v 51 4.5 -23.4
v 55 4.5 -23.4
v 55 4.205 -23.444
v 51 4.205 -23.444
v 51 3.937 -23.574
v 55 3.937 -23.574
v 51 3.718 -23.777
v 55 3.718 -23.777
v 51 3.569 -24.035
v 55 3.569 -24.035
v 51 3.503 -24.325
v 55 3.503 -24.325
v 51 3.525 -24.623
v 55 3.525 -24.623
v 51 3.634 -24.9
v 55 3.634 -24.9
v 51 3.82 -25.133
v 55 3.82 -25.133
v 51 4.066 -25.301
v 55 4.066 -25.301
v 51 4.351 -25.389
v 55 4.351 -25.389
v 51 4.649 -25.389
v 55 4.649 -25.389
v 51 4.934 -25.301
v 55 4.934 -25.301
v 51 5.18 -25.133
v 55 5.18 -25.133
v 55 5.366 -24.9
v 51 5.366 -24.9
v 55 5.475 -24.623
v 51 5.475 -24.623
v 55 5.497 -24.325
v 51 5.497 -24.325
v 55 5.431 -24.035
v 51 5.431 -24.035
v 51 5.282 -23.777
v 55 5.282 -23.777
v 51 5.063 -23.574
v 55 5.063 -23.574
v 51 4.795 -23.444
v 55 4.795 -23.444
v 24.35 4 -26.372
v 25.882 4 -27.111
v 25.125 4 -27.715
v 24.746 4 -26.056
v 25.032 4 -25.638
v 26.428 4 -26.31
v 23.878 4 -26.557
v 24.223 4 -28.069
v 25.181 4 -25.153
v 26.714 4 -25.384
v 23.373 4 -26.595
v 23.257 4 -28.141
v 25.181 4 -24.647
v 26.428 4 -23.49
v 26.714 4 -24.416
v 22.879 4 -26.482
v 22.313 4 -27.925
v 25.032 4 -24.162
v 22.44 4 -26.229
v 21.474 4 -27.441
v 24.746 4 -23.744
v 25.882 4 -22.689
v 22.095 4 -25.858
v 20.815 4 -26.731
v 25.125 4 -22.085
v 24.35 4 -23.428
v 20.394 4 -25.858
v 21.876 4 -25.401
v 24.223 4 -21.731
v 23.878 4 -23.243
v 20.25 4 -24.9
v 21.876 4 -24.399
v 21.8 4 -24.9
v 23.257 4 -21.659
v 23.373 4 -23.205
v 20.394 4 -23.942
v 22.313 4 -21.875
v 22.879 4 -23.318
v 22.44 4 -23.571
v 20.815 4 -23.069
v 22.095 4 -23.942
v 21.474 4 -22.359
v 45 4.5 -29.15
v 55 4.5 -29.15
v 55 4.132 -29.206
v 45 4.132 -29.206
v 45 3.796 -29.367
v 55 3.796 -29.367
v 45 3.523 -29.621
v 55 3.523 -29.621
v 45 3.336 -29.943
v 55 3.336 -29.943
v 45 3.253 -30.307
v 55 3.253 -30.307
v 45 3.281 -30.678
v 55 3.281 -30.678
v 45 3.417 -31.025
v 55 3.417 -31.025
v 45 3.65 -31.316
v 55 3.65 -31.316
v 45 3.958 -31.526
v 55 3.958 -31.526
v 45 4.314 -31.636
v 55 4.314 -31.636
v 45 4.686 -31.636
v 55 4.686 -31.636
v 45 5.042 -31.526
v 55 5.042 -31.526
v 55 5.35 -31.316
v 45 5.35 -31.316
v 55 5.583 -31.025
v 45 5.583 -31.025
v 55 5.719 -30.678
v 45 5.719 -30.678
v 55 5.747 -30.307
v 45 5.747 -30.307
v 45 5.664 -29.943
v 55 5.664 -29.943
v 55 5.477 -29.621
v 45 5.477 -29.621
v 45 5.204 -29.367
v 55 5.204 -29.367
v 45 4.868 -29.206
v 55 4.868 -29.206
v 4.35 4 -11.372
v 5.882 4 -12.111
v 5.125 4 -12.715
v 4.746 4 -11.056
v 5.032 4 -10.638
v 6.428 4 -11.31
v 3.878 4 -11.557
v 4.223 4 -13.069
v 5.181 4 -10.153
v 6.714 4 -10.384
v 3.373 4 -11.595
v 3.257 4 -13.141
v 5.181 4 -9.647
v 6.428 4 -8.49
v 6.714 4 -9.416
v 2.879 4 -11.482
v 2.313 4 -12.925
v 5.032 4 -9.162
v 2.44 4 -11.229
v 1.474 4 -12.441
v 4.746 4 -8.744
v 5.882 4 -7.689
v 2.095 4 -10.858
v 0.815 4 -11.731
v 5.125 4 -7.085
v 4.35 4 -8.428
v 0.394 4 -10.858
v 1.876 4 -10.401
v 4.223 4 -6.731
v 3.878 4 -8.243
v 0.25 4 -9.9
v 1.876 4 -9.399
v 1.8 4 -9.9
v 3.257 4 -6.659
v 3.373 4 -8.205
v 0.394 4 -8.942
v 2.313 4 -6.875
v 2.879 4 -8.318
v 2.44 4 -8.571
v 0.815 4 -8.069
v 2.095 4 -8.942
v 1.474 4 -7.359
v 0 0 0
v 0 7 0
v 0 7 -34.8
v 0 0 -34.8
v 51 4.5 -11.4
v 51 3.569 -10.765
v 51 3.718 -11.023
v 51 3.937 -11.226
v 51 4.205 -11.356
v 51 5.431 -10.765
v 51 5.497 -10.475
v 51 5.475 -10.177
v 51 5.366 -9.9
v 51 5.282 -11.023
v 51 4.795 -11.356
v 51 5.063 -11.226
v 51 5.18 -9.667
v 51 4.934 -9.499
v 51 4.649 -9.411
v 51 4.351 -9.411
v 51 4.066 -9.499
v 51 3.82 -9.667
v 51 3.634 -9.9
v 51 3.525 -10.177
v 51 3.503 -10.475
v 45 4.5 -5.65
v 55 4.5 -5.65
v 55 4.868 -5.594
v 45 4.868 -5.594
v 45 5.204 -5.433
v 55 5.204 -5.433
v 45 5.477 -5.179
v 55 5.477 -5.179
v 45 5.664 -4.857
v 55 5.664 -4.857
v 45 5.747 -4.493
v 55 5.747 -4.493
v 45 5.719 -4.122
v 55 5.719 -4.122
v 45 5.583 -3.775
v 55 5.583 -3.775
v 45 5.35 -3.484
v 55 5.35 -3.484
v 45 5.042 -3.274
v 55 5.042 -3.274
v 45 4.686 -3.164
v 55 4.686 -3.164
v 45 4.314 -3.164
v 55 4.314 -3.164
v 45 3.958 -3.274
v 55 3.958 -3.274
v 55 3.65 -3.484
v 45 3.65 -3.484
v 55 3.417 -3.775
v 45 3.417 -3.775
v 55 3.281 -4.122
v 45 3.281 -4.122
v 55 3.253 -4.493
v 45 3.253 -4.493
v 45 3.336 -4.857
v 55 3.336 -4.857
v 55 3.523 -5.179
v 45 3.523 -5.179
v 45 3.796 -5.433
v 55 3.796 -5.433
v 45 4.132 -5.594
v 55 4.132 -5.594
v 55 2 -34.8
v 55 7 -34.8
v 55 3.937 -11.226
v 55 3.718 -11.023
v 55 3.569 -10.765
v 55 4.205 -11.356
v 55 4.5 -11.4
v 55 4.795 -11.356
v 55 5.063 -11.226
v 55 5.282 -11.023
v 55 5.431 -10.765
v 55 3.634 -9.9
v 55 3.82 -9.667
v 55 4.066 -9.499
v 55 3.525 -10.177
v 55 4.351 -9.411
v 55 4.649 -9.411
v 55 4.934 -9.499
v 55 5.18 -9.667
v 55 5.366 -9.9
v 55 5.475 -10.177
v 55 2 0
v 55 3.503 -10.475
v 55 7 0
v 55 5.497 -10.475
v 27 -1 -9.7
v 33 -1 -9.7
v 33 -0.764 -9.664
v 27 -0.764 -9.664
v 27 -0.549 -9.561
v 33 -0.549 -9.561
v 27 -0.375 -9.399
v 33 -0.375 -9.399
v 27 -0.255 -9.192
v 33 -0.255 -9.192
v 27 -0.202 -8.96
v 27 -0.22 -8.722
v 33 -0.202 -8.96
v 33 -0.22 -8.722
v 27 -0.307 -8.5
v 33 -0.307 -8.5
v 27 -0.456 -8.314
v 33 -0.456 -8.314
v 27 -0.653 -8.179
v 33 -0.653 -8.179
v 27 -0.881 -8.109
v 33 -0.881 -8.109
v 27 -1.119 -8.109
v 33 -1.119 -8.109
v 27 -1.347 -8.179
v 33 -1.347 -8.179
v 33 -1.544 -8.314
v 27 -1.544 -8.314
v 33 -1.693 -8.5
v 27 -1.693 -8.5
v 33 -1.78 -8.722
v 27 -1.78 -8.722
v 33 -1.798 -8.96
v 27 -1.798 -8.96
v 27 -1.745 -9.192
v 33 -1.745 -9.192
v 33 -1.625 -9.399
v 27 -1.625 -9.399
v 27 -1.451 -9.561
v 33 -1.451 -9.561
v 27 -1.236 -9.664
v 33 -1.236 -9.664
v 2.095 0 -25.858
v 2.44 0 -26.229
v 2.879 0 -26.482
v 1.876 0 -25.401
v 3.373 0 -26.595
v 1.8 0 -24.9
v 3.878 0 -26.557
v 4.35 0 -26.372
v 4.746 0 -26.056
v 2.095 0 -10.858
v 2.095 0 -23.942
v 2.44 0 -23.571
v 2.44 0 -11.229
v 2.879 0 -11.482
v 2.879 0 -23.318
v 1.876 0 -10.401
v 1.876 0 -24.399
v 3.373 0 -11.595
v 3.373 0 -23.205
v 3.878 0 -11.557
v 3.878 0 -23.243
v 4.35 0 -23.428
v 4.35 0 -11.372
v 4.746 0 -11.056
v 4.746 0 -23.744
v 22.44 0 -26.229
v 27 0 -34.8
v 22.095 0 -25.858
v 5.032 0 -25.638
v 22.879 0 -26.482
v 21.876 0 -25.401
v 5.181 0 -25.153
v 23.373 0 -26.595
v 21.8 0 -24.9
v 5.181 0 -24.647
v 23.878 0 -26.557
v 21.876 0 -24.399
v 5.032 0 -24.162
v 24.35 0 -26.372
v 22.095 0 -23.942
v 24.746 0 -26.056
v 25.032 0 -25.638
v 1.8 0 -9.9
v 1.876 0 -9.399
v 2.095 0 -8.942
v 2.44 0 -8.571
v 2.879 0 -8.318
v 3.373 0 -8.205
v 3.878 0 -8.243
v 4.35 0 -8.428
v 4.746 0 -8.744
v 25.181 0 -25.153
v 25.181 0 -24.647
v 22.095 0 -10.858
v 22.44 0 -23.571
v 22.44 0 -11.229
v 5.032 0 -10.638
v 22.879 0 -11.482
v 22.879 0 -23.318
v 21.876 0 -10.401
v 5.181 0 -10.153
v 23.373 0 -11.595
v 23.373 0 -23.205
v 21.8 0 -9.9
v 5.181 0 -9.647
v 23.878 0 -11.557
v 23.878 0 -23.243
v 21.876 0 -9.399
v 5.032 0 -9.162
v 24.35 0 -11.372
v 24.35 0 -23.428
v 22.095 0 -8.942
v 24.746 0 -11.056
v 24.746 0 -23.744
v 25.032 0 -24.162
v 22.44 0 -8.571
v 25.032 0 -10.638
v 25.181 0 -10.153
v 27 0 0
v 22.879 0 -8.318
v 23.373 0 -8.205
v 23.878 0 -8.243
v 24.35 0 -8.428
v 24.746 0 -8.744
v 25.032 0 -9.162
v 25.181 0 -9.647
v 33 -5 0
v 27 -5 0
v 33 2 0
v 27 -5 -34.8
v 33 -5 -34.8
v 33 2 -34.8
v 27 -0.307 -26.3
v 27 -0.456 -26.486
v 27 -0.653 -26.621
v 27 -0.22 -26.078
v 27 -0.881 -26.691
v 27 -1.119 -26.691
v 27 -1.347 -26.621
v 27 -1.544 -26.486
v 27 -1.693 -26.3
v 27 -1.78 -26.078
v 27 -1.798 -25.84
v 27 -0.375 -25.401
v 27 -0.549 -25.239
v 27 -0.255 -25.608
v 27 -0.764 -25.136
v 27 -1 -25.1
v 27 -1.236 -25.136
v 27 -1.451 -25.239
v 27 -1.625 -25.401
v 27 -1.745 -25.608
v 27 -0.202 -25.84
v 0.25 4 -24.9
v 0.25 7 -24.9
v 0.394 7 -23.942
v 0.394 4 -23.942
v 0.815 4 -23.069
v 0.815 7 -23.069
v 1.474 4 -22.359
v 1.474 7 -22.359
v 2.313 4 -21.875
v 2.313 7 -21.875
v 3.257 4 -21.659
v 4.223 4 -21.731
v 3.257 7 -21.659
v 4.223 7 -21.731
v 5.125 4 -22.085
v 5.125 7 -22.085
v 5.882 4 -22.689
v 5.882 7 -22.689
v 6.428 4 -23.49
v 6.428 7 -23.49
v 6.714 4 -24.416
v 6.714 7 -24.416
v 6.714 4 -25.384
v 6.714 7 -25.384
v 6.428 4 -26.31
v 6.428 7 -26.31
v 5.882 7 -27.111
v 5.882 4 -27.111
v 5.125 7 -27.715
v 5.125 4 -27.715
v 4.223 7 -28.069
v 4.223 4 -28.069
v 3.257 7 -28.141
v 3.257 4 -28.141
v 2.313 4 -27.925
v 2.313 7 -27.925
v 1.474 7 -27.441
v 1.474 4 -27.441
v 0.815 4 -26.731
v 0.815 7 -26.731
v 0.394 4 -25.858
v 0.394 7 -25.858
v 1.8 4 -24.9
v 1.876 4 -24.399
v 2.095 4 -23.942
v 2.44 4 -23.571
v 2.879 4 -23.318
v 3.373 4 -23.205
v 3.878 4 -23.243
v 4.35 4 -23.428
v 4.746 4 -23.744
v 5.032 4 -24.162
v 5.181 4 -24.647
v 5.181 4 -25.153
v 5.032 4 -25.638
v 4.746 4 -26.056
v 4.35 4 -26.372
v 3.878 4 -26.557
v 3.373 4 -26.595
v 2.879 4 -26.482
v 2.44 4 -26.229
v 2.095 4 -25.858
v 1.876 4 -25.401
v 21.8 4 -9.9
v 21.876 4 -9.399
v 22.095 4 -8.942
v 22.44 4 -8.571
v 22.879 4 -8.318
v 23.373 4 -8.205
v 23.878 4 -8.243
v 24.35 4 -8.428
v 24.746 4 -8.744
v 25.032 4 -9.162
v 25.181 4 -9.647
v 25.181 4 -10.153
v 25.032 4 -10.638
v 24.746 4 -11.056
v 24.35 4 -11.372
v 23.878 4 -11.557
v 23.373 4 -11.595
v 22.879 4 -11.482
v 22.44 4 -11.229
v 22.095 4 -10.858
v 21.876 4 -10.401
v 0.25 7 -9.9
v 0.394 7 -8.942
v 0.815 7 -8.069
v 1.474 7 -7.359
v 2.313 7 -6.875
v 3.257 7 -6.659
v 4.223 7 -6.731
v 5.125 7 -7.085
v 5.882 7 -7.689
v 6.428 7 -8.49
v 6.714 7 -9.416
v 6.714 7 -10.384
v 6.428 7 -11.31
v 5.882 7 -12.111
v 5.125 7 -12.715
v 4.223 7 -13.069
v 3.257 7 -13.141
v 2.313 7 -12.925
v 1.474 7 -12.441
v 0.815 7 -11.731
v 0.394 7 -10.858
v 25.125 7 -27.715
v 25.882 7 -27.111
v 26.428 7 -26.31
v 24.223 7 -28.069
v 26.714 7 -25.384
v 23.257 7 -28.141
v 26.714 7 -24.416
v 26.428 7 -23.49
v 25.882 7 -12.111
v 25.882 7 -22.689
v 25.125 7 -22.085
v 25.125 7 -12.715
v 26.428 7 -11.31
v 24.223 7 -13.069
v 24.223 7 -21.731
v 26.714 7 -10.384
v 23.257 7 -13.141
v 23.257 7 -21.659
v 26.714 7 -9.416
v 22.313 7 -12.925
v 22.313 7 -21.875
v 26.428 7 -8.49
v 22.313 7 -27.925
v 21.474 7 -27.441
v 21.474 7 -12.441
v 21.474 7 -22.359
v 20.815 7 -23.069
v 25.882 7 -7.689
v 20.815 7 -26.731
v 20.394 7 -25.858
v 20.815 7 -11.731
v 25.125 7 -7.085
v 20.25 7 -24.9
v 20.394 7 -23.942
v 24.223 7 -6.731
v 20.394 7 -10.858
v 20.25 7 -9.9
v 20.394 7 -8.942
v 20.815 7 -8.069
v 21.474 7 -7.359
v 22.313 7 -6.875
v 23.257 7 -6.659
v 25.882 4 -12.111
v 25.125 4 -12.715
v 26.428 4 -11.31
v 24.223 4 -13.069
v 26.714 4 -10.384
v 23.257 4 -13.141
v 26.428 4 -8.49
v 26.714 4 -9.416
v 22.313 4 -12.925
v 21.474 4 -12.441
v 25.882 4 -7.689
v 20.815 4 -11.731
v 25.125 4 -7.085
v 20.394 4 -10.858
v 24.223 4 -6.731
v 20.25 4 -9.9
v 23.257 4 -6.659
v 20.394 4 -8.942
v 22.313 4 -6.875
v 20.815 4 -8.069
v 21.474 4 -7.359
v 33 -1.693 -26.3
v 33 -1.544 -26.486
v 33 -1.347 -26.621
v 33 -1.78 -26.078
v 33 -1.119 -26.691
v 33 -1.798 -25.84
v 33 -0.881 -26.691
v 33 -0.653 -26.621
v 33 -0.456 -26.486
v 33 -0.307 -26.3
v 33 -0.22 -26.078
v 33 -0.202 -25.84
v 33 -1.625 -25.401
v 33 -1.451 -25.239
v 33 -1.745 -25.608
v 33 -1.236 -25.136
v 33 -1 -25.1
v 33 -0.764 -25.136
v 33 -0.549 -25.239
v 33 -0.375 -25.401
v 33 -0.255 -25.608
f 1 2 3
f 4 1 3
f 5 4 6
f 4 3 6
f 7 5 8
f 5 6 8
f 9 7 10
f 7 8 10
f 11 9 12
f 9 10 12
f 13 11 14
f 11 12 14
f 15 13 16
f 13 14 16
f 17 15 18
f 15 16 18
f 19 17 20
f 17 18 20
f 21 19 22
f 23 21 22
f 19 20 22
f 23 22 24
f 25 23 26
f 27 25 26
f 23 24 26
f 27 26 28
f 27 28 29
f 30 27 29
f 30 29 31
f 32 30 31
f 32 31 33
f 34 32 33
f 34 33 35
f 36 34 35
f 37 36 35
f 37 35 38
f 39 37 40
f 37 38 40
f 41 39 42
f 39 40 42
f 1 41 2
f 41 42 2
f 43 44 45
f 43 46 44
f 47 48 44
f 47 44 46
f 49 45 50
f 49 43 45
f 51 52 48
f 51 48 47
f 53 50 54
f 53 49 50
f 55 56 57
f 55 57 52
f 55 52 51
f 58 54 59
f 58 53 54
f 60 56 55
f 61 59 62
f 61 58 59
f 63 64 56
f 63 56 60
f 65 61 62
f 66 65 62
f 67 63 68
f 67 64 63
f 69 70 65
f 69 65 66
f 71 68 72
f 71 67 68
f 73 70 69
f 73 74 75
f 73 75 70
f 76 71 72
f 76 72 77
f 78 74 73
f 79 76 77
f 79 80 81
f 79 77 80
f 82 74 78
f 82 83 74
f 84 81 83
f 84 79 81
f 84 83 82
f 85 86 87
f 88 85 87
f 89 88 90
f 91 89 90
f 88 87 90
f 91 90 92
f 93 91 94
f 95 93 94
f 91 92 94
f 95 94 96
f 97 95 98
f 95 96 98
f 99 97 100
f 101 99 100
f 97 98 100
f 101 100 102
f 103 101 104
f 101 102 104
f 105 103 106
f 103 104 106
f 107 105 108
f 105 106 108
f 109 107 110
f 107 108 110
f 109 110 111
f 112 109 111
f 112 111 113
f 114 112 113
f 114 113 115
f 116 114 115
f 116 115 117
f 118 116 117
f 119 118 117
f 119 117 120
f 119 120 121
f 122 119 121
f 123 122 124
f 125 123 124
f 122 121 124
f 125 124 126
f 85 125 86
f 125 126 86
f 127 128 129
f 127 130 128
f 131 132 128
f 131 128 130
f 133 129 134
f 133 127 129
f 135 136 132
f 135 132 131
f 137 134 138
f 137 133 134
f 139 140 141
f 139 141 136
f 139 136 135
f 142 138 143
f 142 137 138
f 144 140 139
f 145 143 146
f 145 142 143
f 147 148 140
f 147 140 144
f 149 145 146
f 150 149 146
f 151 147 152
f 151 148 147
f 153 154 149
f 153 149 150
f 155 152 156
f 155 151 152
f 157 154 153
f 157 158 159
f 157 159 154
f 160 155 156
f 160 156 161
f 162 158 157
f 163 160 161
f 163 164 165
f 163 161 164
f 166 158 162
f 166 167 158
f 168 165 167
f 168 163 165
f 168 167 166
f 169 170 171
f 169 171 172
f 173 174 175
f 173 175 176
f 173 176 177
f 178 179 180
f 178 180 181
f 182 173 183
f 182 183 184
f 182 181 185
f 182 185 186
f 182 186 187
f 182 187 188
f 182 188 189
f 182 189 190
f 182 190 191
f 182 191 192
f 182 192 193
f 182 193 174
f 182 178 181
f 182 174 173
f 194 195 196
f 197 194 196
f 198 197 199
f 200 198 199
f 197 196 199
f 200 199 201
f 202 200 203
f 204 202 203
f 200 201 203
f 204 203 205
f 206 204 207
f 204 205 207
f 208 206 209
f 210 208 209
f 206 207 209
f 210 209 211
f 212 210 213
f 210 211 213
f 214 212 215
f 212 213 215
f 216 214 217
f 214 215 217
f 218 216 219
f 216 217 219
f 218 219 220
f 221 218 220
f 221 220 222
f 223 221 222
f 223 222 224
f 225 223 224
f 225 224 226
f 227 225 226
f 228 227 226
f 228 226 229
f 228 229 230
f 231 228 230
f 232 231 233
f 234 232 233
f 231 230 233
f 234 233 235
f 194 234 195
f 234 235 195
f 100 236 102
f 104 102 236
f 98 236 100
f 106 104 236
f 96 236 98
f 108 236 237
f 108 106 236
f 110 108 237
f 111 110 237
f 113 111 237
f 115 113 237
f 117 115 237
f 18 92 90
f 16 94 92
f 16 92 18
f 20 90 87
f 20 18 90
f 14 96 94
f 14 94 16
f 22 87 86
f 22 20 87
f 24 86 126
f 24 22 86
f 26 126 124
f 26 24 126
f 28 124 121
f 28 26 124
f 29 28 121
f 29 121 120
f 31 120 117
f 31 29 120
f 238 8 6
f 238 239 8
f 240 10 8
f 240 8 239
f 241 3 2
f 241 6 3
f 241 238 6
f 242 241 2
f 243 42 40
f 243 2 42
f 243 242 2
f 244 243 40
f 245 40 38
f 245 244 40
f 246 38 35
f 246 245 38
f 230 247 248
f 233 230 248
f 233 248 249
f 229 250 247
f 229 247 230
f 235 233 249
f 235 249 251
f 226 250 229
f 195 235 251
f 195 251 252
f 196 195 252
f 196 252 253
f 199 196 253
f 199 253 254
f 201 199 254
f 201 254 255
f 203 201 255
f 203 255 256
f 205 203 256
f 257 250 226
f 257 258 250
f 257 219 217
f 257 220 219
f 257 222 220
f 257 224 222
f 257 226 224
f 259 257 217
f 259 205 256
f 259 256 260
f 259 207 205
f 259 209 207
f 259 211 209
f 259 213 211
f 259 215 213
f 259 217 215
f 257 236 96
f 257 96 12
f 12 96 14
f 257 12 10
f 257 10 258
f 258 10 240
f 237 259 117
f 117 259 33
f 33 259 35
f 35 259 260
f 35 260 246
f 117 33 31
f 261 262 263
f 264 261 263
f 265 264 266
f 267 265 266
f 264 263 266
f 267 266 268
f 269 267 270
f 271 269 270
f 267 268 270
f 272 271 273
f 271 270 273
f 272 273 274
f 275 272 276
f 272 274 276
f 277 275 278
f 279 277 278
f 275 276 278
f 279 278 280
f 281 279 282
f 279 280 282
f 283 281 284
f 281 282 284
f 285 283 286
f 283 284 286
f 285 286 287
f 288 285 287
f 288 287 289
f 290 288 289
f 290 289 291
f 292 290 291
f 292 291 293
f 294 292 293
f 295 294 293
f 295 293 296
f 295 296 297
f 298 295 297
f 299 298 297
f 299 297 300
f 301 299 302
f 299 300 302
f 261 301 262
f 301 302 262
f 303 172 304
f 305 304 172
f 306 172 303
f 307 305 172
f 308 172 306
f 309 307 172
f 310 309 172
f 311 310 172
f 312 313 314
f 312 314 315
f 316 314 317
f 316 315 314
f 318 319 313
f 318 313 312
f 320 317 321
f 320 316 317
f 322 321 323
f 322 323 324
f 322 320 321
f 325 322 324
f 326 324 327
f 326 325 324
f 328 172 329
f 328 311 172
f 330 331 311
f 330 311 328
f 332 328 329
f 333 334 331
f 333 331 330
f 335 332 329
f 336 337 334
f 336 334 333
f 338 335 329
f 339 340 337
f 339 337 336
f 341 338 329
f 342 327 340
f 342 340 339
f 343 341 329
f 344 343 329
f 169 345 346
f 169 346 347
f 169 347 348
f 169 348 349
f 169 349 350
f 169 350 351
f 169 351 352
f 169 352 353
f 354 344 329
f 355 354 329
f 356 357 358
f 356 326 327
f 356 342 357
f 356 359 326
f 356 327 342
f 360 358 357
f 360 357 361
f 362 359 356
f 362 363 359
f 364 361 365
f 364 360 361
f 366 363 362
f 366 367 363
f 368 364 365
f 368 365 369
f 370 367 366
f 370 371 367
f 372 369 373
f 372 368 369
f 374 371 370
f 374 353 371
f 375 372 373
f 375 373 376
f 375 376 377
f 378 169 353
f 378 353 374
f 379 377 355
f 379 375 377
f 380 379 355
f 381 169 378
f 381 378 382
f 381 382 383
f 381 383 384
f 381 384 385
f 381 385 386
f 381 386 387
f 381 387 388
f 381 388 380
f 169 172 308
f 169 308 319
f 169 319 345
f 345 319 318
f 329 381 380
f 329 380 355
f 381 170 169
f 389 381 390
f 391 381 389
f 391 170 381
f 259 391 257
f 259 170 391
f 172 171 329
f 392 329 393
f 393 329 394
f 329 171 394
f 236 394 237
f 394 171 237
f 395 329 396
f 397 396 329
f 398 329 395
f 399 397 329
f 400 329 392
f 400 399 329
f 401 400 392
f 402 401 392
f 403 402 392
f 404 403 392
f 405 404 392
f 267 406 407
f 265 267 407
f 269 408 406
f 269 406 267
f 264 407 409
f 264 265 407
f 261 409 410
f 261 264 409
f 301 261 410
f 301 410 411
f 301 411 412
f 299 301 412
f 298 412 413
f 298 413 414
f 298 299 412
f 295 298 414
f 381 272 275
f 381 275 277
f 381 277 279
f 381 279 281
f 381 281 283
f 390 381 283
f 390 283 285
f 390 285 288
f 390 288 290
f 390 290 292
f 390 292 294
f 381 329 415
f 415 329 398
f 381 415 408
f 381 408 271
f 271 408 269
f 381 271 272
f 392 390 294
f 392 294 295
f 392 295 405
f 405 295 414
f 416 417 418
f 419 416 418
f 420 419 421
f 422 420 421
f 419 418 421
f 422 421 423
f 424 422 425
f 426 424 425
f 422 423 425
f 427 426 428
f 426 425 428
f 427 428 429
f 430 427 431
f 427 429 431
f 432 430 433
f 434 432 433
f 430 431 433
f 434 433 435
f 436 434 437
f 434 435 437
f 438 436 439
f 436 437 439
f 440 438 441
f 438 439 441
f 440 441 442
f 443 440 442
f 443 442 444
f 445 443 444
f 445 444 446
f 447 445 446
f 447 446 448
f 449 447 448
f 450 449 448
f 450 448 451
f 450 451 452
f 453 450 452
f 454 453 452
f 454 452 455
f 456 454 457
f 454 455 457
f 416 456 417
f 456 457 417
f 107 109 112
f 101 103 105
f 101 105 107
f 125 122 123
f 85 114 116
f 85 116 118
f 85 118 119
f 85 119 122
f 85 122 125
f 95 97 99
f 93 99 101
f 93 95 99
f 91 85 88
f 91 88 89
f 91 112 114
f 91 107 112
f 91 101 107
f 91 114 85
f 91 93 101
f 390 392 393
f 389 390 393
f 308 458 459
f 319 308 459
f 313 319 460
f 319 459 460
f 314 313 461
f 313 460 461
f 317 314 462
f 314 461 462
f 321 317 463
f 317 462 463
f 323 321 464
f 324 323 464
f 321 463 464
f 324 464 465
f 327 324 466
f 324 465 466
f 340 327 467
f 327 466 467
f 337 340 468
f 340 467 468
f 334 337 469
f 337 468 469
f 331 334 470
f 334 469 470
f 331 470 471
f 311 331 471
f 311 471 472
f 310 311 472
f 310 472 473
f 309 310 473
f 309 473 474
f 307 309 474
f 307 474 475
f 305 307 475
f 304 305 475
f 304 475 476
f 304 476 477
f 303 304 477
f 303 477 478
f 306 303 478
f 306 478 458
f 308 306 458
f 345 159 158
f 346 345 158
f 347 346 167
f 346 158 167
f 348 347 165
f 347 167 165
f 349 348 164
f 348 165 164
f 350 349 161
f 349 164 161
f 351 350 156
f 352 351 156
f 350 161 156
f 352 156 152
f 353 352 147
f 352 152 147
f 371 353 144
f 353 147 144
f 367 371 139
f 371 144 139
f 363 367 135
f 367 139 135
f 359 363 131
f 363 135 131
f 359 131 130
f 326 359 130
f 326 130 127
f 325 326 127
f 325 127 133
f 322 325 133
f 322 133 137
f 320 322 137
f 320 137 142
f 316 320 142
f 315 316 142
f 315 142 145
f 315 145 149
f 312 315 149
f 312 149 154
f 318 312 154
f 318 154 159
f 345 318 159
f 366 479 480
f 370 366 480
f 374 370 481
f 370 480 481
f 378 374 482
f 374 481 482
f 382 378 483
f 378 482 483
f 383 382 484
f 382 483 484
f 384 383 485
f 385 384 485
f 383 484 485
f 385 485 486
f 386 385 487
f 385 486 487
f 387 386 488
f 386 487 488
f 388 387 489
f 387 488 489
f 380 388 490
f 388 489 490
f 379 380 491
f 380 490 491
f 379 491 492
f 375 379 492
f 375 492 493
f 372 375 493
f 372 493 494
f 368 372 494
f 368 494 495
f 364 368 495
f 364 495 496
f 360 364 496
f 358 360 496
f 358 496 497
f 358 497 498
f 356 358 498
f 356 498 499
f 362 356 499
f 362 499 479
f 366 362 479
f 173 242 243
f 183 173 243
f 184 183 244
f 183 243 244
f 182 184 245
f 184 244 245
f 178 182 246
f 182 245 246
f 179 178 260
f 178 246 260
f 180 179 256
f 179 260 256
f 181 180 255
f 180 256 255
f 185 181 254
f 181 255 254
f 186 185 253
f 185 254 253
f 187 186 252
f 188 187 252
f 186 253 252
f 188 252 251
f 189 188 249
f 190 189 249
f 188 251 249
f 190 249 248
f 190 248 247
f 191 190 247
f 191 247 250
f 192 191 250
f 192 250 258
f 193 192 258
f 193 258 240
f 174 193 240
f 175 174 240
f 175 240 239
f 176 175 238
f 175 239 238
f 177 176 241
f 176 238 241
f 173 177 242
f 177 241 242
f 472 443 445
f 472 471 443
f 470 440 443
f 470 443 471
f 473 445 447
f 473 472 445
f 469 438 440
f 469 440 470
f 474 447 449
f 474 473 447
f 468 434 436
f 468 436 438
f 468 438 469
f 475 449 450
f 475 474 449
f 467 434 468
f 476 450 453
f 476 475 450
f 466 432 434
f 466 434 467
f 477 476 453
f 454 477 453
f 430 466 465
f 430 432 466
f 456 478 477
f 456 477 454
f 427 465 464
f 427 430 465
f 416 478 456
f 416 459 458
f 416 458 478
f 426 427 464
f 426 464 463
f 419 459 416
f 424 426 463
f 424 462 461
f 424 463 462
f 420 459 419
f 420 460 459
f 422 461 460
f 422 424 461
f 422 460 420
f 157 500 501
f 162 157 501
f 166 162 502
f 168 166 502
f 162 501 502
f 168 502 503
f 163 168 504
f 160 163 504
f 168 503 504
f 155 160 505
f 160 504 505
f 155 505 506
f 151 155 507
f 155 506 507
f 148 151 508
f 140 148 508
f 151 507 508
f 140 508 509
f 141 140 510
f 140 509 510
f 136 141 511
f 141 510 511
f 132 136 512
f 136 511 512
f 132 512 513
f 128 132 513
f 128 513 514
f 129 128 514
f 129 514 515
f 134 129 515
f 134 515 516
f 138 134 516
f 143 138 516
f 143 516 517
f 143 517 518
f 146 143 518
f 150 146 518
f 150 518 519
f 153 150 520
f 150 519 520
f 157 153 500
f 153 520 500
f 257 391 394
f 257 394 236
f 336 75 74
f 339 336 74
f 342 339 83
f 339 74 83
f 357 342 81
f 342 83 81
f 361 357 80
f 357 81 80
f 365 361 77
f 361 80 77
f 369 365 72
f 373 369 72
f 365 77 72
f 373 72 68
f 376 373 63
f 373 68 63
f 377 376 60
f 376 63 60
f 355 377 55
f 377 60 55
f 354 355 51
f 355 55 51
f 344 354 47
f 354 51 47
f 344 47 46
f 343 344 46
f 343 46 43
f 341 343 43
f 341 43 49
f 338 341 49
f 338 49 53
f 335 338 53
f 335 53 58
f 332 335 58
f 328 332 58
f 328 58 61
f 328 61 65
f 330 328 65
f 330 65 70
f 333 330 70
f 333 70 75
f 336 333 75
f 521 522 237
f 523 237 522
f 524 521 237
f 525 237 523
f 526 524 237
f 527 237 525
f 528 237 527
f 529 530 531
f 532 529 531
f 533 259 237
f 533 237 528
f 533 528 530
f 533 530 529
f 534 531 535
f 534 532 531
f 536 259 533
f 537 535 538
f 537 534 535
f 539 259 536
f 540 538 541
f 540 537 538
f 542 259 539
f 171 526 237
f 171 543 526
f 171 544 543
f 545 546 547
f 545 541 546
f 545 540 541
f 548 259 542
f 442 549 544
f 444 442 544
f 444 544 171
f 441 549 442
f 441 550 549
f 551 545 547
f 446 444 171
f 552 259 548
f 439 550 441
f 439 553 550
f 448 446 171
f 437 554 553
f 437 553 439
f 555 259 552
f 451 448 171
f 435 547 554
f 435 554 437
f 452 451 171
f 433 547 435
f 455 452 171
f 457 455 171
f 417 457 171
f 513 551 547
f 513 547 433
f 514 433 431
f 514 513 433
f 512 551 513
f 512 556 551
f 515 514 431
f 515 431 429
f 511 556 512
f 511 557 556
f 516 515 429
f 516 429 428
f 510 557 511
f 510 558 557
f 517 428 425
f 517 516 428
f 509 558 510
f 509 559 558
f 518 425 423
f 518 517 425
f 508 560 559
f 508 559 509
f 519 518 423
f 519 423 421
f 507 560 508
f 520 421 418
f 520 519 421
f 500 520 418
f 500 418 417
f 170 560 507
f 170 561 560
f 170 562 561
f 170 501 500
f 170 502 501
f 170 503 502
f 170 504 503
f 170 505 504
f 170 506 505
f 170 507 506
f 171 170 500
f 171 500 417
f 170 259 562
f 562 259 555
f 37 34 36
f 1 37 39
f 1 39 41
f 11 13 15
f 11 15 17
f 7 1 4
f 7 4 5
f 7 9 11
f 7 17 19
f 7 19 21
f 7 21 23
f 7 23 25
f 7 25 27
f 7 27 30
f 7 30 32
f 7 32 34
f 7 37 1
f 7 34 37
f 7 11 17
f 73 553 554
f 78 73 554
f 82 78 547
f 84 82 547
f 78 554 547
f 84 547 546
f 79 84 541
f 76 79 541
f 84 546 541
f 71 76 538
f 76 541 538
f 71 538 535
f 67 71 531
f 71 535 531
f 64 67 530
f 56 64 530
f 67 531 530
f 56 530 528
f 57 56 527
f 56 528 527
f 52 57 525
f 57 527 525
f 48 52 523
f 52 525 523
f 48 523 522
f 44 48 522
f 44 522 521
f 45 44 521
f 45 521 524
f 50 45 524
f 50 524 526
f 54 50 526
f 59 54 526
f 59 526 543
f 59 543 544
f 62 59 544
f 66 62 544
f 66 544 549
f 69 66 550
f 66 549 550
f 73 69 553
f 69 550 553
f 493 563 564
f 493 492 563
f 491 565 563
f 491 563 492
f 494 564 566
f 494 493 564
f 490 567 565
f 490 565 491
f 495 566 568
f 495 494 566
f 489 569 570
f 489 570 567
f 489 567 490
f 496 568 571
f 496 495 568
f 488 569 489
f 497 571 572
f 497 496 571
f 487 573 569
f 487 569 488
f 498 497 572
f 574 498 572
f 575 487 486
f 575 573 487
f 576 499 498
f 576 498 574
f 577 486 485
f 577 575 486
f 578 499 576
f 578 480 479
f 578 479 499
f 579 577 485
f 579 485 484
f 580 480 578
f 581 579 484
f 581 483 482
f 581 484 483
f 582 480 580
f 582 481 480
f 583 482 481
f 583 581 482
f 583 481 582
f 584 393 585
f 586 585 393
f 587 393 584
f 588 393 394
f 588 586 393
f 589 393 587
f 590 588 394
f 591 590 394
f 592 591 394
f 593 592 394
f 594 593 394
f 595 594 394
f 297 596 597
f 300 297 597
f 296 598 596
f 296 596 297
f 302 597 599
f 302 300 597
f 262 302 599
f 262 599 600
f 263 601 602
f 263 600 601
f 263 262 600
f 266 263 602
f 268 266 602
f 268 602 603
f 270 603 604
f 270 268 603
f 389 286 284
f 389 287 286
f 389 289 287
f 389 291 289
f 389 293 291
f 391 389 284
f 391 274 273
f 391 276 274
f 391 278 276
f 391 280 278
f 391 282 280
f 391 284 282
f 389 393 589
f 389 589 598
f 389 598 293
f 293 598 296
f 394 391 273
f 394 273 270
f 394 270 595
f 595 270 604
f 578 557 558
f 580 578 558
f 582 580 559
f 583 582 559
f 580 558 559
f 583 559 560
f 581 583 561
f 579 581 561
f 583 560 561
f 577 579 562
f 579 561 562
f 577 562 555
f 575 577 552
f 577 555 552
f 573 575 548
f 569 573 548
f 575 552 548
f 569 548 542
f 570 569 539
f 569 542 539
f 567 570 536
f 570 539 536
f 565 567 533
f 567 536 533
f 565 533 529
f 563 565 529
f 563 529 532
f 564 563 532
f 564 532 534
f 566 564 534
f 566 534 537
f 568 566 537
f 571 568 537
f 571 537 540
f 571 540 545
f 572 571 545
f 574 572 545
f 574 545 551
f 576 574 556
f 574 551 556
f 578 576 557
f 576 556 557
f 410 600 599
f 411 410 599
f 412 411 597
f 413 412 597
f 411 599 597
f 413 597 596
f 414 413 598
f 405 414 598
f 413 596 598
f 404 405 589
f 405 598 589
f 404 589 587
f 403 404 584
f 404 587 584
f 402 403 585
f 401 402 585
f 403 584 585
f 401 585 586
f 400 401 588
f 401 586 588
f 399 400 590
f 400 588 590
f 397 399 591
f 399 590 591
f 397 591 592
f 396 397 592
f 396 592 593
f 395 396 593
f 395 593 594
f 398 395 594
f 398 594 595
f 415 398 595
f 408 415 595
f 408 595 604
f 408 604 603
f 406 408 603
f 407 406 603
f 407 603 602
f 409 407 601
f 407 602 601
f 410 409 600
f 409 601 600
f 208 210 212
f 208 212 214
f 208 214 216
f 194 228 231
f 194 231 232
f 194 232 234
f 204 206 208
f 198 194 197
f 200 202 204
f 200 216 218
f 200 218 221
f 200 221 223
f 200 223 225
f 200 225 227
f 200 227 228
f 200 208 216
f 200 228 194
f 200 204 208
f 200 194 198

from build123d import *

# Parameters (mm, degrees)
BOSS_EXTRUDE1_DEPTH = 34.8
CUT_EXTRUDE1_REACH  = 68.182
SKETCH2_R           = 1.7
SKETCH3_R           = 0.8
CUT_EXTRUDE2_DEPTH  = 6
SKETCH4_R           = 1.25
CUT_EXTRUDE3_DEPTH  = 10
SKETCH5_R           = 1
CUT_EXTRUDE4_DEPTH  = 4
SKETCH6_R           = 3.25
CUT_EXTRUDE5_DEPTH  = 3


with BuildPart() as part:
    # Sketch1 → Boss-Extrude1 (new body)
    with BuildSketch(Plane.XY):
        Polygon((0, 0), (27, 0), (27, -5), (33, -5), (33, 2), (55, 2), (55, 7), (0, 7), align=None)
    extrude(amount=-BOSS_EXTRUDE1_DEPTH)

    # Sketch2 → Cut-Extrude1 (cut, up to next)
    with BuildSketch(Plane(origin=(0, 7, 0), x_dir=(1, 0, 0), z_dir=(0, 1, 0)), mode=Mode.PRIVATE) as cut_extrude1_sk1:
        with Locations(Location((3.5, 24.9, 0), (0, 0, 180))):
            Circle(SKETCH2_R)
    cut_extrude1_tool1 = extrude(cut_extrude1_sk1.sketch, amount=-CUT_EXTRUDE1_REACH, mode=Mode.PRIVATE) & part.part
    # Sketch2 → Cut-Extrude1 (cut, up to next)
    with BuildSketch(Plane(origin=(0, 7, 0), x_dir=(1, 0, 0), z_dir=(0, 1, 0)), mode=Mode.PRIVATE) as cut_extrude1_sk2:
        with Locations(Location((23.5, 24.9, 0), (0, 0, 180))):
            Circle(SKETCH2_R)
    cut_extrude1_tool2 = extrude(cut_extrude1_sk2.sketch, amount=-CUT_EXTRUDE1_REACH, mode=Mode.PRIVATE) & part.part
    # Sketch2 → Cut-Extrude1 (cut, up to next)
    with BuildSketch(Plane(origin=(0, 7, 0), x_dir=(1, 0, 0), z_dir=(0, 1, 0)), mode=Mode.PRIVATE) as cut_extrude1_sk3:
        with Locations(Location((23.5, 9.9, 0), (0, 0, 180))):
            Circle(SKETCH2_R)
    cut_extrude1_tool3 = extrude(cut_extrude1_sk3.sketch, amount=-CUT_EXTRUDE1_REACH, mode=Mode.PRIVATE) & part.part
    # Sketch2 → Cut-Extrude1 (cut, up to next)
    with BuildSketch(Plane(origin=(0, 7, 0), x_dir=(1, 0, 0), z_dir=(0, 1, 0)), mode=Mode.PRIVATE) as cut_extrude1_sk4:
        with Locations(Location((3.5, 9.9, 0), (0, 0, 180))):
            Circle(SKETCH2_R)
    cut_extrude1_tool4 = extrude(cut_extrude1_sk4.sketch, amount=-CUT_EXTRUDE1_REACH, mode=Mode.PRIVATE) & part.part
    add(cut_extrude1_tool1.solids().sort_by_distance((3.5, 7, -24.9))[0], mode=Mode.SUBTRACT)
    add(cut_extrude1_tool2.solids().sort_by_distance((23.5, 7, -24.9))[0], mode=Mode.SUBTRACT)
    add(cut_extrude1_tool3.solids().sort_by_distance((23.5, 7, -9.9))[0], mode=Mode.SUBTRACT)
    add(cut_extrude1_tool4.solids().sort_by_distance((3.5, 7, -9.9))[0], mode=Mode.SUBTRACT)

    # Sketch3 → Cut-Extrude2 (cut)
    with BuildSketch(Plane(origin=(33, 0, 0), x_dir=(0, 0, -1), z_dir=(1, 0, 0))):
        with Locations((8.9, -1)):
            Circle(SKETCH3_R)
        with Locations(Location((25.9, -1, 0), (0, 0, 180))):
            Circle(SKETCH3_R)
    extrude(amount=-CUT_EXTRUDE2_DEPTH, mode=Mode.SUBTRACT)

    # Sketch4 → Cut-Extrude3 (cut)
    with BuildSketch(Plane(origin=(55, 0, 0), x_dir=(0, 0, -1), z_dir=(1, 0, 0))):
        with Locations((4.4, 4.5)):
            Circle(SKETCH4_R)
        with Locations(Location((30.4, 4.5, 0), (0, 0, 180))):
            Circle(SKETCH4_R)
    extrude(amount=-CUT_EXTRUDE3_DEPTH, mode=Mode.SUBTRACT)

    # Sketch5 → Cut-Extrude4 (cut)
    with BuildSketch(Plane(origin=(55, 0, 0), x_dir=(0, 0, -1), z_dir=(1, 0, 0))):
        with Locations((10.4, 4.5)):
            Circle(SKETCH5_R)
        with Locations(Location((24.4, 4.5, 0), (0, 0, 180))):
            Circle(SKETCH5_R)
    extrude(amount=-CUT_EXTRUDE4_DEPTH, mode=Mode.SUBTRACT)

    # Sketch6 → Cut-Extrude5 (cut)
    with BuildSketch(Plane(origin=(0, 7, 0), x_dir=(1, 0, 0), z_dir=(0, 1, 0))):
        with Locations(Location((3.5, 24.9, 0), (0, 0, 180))):
            Circle(SKETCH6_R)
        with Locations(Location((23.5, 24.9, 0), (0, 0, 180))):
            Circle(SKETCH6_R)
        with Locations(Location((23.5, 9.9, 0), (0, 0, 180))):
            Circle(SKETCH6_R)
        with Locations(Location((3.5, 9.9, 0), (0, 0, 180))):
            Circle(SKETCH6_R)
    extrude(amount=-CUT_EXTRUDE5_DEPTH, mode=Mode.SUBTRACT)


solid = part.part
